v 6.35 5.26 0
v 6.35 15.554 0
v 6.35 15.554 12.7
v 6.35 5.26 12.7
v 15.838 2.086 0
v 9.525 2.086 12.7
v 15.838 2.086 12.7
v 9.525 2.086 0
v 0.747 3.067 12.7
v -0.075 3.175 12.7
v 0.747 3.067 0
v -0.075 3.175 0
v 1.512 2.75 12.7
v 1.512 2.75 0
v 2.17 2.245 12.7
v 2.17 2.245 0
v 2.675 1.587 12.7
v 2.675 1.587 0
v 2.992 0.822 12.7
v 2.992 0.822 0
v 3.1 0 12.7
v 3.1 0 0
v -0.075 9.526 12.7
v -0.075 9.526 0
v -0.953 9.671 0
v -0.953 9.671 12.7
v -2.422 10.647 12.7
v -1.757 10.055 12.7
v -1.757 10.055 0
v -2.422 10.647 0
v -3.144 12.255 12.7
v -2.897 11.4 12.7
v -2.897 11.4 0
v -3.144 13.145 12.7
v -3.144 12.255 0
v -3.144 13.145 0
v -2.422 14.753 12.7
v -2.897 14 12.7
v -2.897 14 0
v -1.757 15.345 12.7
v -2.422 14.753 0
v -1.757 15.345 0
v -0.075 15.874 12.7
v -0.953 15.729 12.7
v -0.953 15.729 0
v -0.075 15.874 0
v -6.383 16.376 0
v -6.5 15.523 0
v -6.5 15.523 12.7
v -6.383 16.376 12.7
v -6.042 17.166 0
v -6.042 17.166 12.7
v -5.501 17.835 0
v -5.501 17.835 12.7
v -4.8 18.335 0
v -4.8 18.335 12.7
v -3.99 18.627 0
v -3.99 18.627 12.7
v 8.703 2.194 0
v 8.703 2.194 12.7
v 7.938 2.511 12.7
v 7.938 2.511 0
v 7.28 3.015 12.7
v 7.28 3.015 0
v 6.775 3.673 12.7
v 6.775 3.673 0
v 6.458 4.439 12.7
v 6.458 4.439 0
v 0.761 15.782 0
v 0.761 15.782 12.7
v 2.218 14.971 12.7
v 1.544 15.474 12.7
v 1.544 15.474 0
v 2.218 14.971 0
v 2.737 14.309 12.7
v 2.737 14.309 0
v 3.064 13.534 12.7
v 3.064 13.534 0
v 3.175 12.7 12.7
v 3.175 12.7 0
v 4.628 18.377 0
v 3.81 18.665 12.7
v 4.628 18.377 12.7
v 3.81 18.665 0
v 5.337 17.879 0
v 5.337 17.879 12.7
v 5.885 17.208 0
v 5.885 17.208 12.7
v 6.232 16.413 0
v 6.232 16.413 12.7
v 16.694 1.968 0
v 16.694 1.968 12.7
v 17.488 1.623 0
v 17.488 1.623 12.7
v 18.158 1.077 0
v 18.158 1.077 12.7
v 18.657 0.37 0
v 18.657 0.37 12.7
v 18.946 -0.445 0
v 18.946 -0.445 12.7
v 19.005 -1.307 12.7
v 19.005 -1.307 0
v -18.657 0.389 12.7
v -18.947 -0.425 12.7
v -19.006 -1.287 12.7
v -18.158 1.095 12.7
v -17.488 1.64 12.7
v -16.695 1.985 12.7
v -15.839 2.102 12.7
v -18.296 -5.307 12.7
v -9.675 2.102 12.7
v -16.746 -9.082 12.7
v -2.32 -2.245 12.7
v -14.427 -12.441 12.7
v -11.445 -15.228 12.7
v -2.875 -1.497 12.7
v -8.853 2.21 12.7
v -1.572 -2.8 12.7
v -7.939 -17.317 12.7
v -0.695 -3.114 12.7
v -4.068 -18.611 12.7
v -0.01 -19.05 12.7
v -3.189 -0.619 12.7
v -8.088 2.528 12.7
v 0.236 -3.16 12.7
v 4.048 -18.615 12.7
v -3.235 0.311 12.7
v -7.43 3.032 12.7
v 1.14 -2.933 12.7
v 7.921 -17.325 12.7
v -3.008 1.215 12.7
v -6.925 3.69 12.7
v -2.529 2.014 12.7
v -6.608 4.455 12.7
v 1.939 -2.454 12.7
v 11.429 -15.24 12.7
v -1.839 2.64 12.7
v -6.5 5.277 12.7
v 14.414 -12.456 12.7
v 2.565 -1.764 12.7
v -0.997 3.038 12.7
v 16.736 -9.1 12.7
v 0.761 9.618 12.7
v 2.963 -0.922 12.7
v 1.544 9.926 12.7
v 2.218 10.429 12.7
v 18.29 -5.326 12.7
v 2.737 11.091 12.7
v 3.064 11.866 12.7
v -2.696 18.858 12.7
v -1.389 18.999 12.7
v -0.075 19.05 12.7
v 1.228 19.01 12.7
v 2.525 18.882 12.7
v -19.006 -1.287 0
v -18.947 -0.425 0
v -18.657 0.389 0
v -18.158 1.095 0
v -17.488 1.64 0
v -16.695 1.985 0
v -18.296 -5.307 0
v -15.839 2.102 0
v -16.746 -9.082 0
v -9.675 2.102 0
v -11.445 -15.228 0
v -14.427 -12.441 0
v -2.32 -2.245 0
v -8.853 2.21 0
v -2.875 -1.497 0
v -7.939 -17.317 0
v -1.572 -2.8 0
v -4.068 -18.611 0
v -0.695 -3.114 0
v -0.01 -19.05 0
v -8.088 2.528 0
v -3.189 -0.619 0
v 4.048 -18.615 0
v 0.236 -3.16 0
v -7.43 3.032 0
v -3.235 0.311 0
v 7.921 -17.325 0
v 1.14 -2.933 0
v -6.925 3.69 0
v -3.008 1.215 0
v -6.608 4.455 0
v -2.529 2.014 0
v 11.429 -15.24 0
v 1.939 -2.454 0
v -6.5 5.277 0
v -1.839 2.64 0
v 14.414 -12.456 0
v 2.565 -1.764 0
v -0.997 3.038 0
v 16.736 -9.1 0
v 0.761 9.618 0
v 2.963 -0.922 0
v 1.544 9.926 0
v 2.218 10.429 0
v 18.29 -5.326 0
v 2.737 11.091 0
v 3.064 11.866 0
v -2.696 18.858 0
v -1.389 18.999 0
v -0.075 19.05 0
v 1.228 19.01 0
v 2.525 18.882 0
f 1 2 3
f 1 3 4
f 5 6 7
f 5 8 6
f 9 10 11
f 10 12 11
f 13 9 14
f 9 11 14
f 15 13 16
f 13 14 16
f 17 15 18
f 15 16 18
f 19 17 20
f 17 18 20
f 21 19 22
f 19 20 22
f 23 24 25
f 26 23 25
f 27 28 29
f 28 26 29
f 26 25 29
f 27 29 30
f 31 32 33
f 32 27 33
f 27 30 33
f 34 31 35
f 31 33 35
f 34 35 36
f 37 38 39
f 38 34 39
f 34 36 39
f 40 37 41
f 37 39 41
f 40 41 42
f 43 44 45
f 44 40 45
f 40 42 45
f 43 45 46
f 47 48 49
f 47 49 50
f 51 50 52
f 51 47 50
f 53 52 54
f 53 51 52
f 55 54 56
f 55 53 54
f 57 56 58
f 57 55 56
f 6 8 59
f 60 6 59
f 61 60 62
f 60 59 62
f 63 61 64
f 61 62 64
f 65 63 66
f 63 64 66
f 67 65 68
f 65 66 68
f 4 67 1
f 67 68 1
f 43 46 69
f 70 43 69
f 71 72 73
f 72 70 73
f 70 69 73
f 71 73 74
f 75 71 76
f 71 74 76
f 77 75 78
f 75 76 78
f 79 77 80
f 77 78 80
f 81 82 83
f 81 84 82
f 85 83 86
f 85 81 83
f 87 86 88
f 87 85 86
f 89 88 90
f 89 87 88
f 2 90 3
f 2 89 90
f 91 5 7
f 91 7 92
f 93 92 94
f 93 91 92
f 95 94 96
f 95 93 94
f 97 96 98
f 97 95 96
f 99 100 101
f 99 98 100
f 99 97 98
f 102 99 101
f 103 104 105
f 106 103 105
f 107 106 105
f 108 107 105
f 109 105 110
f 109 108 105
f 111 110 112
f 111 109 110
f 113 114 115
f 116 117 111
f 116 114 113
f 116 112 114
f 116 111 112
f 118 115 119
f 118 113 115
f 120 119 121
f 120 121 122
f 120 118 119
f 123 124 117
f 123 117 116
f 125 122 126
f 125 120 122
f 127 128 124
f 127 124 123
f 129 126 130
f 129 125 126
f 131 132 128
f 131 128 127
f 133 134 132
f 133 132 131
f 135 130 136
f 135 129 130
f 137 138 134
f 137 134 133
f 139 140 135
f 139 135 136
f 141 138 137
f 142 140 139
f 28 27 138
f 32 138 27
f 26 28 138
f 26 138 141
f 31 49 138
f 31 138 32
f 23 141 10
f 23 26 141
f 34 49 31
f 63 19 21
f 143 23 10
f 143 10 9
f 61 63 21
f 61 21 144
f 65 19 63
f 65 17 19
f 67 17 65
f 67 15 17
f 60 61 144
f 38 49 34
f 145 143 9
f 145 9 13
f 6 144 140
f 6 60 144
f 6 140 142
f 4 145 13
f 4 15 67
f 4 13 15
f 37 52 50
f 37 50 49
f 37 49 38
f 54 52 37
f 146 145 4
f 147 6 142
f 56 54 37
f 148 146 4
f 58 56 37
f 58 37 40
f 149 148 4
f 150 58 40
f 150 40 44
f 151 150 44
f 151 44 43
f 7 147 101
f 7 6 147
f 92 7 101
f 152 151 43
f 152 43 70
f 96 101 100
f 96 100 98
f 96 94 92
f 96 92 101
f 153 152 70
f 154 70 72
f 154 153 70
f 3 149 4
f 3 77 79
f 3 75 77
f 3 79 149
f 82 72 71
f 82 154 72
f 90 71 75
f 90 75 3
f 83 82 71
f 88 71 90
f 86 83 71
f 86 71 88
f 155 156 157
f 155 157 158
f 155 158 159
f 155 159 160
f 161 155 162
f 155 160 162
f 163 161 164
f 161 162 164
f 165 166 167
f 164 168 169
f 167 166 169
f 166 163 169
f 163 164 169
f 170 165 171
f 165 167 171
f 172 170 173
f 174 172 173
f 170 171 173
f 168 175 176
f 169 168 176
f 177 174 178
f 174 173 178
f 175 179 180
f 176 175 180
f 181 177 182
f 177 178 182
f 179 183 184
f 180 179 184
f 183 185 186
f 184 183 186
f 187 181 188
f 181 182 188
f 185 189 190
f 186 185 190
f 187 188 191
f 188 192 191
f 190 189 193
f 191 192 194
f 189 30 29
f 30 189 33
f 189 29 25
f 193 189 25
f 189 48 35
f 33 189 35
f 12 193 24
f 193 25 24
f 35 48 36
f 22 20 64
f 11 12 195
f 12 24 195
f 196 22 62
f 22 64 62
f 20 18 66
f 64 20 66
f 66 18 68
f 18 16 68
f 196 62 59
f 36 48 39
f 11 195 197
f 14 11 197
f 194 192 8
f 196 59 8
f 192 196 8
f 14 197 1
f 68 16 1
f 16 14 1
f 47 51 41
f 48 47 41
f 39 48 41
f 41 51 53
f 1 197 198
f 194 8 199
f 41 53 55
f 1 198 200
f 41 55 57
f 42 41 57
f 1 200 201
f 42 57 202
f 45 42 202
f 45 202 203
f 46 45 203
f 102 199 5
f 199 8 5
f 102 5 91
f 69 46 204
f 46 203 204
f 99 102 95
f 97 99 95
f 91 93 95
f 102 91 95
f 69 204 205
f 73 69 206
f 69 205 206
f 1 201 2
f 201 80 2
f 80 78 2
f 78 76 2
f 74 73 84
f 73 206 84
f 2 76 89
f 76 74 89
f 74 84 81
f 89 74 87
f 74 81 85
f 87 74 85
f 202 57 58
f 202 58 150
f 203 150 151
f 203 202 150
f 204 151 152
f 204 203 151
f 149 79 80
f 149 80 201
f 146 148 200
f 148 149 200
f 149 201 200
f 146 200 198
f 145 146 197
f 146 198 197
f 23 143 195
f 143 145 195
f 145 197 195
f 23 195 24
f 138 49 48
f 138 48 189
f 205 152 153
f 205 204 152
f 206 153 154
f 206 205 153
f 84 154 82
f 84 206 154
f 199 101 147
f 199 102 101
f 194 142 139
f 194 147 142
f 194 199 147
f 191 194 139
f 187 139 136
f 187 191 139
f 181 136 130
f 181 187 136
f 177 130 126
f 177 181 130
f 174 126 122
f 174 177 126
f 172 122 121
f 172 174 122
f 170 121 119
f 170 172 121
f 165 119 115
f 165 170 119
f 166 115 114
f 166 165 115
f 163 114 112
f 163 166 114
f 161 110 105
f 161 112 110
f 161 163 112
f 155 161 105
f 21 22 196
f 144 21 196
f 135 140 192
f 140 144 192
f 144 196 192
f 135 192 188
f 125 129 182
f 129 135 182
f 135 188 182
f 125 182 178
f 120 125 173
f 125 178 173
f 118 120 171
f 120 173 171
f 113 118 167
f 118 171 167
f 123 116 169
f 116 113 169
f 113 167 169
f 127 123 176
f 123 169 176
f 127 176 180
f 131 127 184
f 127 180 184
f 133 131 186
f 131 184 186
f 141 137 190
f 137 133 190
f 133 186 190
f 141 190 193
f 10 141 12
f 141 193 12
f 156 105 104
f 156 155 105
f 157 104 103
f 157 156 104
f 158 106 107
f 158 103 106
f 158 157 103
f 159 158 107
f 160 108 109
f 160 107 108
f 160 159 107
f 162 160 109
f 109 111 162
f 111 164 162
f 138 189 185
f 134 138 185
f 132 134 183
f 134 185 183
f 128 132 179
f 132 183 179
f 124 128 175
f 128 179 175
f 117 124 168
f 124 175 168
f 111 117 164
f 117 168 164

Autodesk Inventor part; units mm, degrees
ref_plane "YZ Plane" through (0, 0, 0) normal (1, 0, 0) x (0, 1, 0)
ref_plane "XZ Plane" through (0, 0, 0) normal (0, 1, 0) x (-1, 0, 0)
ref_plane "XY Plane" through (0, 0, 0) normal (0, 0, 1) x (1, 0, 0)
sketch "Sketch1" plane through (0, 0, 0) normal (0, 0, 1) x (1, 0, 0)
  circle A0 centre (0, 12.7) radius 3.175
  circle A1 centre (-0.0751, 0) radius 3.175
  line L0 (-0.0751, 0) -> (-0.0751, 19.0499)
  line L1 (-0.0751, 3.175) -> (-0.0751, 24.8386)
  line L2 (6.35, 15.5543) -> (6.35, 5.2605)
  line L3 (9.525, 2.0855) -> (15.8376, 2.0855)
  line L4 (-6.5001, 15.5229) -> (-6.5001, 5.2772)
  line L5 (-9.6751, 2.1022) -> (-15.8387, 2.1022)
  arc A2 (-19.0064, -1.2874) -> (19.0051, -1.3074) centre (0, 0) ccw
  arc A3 (3.81, 18.6651) -> (-3.9901, 18.6274) centre (0, 0) ccw
  arc A4 (-3.9901, 18.6274) -> (-6.5001, 15.5229) centre (-3.3251, 15.5229) ccw
  arc A5 (6.35, 15.5543) -> (3.81, 18.6651) centre (3.175, 15.5543) ccw
  arc A6 (6.35, 5.2605) -> (9.525, 2.0855) centre (9.525, 5.2605) ccw
  arc A7 (-9.6751, 2.1022) -> (-6.5001, 5.2772) centre (-9.6751, 5.2772) ccw
  arc A8 (-15.8387, 2.1022) -> (-19.0064, -1.2874) centre (-15.8387, -1.0728) ccw
  arc A9 (19.0051, -1.3074) -> (15.8376, 2.0855) centre (15.8376, -1.0895) ccw
  point P0 (6.35, 17.9605)
  point P1 (6.35, 2.0855)
  point P2 (18.9355, 2.0855)
  point P3 (-6.5001, 2.1022)
  point P4 (-18.9337, 2.1022)
  point P5 (-6.5001, 17.9067)
  dimension "d6" = 6.35
  dimension "d3" = 6.35
  dimension "d11" = 15.875
  dimension "d12" = 3.175
extrude "Extrusion1" add sketch "Sketch1" along normal blind 12.7
properties part number "Crank"
